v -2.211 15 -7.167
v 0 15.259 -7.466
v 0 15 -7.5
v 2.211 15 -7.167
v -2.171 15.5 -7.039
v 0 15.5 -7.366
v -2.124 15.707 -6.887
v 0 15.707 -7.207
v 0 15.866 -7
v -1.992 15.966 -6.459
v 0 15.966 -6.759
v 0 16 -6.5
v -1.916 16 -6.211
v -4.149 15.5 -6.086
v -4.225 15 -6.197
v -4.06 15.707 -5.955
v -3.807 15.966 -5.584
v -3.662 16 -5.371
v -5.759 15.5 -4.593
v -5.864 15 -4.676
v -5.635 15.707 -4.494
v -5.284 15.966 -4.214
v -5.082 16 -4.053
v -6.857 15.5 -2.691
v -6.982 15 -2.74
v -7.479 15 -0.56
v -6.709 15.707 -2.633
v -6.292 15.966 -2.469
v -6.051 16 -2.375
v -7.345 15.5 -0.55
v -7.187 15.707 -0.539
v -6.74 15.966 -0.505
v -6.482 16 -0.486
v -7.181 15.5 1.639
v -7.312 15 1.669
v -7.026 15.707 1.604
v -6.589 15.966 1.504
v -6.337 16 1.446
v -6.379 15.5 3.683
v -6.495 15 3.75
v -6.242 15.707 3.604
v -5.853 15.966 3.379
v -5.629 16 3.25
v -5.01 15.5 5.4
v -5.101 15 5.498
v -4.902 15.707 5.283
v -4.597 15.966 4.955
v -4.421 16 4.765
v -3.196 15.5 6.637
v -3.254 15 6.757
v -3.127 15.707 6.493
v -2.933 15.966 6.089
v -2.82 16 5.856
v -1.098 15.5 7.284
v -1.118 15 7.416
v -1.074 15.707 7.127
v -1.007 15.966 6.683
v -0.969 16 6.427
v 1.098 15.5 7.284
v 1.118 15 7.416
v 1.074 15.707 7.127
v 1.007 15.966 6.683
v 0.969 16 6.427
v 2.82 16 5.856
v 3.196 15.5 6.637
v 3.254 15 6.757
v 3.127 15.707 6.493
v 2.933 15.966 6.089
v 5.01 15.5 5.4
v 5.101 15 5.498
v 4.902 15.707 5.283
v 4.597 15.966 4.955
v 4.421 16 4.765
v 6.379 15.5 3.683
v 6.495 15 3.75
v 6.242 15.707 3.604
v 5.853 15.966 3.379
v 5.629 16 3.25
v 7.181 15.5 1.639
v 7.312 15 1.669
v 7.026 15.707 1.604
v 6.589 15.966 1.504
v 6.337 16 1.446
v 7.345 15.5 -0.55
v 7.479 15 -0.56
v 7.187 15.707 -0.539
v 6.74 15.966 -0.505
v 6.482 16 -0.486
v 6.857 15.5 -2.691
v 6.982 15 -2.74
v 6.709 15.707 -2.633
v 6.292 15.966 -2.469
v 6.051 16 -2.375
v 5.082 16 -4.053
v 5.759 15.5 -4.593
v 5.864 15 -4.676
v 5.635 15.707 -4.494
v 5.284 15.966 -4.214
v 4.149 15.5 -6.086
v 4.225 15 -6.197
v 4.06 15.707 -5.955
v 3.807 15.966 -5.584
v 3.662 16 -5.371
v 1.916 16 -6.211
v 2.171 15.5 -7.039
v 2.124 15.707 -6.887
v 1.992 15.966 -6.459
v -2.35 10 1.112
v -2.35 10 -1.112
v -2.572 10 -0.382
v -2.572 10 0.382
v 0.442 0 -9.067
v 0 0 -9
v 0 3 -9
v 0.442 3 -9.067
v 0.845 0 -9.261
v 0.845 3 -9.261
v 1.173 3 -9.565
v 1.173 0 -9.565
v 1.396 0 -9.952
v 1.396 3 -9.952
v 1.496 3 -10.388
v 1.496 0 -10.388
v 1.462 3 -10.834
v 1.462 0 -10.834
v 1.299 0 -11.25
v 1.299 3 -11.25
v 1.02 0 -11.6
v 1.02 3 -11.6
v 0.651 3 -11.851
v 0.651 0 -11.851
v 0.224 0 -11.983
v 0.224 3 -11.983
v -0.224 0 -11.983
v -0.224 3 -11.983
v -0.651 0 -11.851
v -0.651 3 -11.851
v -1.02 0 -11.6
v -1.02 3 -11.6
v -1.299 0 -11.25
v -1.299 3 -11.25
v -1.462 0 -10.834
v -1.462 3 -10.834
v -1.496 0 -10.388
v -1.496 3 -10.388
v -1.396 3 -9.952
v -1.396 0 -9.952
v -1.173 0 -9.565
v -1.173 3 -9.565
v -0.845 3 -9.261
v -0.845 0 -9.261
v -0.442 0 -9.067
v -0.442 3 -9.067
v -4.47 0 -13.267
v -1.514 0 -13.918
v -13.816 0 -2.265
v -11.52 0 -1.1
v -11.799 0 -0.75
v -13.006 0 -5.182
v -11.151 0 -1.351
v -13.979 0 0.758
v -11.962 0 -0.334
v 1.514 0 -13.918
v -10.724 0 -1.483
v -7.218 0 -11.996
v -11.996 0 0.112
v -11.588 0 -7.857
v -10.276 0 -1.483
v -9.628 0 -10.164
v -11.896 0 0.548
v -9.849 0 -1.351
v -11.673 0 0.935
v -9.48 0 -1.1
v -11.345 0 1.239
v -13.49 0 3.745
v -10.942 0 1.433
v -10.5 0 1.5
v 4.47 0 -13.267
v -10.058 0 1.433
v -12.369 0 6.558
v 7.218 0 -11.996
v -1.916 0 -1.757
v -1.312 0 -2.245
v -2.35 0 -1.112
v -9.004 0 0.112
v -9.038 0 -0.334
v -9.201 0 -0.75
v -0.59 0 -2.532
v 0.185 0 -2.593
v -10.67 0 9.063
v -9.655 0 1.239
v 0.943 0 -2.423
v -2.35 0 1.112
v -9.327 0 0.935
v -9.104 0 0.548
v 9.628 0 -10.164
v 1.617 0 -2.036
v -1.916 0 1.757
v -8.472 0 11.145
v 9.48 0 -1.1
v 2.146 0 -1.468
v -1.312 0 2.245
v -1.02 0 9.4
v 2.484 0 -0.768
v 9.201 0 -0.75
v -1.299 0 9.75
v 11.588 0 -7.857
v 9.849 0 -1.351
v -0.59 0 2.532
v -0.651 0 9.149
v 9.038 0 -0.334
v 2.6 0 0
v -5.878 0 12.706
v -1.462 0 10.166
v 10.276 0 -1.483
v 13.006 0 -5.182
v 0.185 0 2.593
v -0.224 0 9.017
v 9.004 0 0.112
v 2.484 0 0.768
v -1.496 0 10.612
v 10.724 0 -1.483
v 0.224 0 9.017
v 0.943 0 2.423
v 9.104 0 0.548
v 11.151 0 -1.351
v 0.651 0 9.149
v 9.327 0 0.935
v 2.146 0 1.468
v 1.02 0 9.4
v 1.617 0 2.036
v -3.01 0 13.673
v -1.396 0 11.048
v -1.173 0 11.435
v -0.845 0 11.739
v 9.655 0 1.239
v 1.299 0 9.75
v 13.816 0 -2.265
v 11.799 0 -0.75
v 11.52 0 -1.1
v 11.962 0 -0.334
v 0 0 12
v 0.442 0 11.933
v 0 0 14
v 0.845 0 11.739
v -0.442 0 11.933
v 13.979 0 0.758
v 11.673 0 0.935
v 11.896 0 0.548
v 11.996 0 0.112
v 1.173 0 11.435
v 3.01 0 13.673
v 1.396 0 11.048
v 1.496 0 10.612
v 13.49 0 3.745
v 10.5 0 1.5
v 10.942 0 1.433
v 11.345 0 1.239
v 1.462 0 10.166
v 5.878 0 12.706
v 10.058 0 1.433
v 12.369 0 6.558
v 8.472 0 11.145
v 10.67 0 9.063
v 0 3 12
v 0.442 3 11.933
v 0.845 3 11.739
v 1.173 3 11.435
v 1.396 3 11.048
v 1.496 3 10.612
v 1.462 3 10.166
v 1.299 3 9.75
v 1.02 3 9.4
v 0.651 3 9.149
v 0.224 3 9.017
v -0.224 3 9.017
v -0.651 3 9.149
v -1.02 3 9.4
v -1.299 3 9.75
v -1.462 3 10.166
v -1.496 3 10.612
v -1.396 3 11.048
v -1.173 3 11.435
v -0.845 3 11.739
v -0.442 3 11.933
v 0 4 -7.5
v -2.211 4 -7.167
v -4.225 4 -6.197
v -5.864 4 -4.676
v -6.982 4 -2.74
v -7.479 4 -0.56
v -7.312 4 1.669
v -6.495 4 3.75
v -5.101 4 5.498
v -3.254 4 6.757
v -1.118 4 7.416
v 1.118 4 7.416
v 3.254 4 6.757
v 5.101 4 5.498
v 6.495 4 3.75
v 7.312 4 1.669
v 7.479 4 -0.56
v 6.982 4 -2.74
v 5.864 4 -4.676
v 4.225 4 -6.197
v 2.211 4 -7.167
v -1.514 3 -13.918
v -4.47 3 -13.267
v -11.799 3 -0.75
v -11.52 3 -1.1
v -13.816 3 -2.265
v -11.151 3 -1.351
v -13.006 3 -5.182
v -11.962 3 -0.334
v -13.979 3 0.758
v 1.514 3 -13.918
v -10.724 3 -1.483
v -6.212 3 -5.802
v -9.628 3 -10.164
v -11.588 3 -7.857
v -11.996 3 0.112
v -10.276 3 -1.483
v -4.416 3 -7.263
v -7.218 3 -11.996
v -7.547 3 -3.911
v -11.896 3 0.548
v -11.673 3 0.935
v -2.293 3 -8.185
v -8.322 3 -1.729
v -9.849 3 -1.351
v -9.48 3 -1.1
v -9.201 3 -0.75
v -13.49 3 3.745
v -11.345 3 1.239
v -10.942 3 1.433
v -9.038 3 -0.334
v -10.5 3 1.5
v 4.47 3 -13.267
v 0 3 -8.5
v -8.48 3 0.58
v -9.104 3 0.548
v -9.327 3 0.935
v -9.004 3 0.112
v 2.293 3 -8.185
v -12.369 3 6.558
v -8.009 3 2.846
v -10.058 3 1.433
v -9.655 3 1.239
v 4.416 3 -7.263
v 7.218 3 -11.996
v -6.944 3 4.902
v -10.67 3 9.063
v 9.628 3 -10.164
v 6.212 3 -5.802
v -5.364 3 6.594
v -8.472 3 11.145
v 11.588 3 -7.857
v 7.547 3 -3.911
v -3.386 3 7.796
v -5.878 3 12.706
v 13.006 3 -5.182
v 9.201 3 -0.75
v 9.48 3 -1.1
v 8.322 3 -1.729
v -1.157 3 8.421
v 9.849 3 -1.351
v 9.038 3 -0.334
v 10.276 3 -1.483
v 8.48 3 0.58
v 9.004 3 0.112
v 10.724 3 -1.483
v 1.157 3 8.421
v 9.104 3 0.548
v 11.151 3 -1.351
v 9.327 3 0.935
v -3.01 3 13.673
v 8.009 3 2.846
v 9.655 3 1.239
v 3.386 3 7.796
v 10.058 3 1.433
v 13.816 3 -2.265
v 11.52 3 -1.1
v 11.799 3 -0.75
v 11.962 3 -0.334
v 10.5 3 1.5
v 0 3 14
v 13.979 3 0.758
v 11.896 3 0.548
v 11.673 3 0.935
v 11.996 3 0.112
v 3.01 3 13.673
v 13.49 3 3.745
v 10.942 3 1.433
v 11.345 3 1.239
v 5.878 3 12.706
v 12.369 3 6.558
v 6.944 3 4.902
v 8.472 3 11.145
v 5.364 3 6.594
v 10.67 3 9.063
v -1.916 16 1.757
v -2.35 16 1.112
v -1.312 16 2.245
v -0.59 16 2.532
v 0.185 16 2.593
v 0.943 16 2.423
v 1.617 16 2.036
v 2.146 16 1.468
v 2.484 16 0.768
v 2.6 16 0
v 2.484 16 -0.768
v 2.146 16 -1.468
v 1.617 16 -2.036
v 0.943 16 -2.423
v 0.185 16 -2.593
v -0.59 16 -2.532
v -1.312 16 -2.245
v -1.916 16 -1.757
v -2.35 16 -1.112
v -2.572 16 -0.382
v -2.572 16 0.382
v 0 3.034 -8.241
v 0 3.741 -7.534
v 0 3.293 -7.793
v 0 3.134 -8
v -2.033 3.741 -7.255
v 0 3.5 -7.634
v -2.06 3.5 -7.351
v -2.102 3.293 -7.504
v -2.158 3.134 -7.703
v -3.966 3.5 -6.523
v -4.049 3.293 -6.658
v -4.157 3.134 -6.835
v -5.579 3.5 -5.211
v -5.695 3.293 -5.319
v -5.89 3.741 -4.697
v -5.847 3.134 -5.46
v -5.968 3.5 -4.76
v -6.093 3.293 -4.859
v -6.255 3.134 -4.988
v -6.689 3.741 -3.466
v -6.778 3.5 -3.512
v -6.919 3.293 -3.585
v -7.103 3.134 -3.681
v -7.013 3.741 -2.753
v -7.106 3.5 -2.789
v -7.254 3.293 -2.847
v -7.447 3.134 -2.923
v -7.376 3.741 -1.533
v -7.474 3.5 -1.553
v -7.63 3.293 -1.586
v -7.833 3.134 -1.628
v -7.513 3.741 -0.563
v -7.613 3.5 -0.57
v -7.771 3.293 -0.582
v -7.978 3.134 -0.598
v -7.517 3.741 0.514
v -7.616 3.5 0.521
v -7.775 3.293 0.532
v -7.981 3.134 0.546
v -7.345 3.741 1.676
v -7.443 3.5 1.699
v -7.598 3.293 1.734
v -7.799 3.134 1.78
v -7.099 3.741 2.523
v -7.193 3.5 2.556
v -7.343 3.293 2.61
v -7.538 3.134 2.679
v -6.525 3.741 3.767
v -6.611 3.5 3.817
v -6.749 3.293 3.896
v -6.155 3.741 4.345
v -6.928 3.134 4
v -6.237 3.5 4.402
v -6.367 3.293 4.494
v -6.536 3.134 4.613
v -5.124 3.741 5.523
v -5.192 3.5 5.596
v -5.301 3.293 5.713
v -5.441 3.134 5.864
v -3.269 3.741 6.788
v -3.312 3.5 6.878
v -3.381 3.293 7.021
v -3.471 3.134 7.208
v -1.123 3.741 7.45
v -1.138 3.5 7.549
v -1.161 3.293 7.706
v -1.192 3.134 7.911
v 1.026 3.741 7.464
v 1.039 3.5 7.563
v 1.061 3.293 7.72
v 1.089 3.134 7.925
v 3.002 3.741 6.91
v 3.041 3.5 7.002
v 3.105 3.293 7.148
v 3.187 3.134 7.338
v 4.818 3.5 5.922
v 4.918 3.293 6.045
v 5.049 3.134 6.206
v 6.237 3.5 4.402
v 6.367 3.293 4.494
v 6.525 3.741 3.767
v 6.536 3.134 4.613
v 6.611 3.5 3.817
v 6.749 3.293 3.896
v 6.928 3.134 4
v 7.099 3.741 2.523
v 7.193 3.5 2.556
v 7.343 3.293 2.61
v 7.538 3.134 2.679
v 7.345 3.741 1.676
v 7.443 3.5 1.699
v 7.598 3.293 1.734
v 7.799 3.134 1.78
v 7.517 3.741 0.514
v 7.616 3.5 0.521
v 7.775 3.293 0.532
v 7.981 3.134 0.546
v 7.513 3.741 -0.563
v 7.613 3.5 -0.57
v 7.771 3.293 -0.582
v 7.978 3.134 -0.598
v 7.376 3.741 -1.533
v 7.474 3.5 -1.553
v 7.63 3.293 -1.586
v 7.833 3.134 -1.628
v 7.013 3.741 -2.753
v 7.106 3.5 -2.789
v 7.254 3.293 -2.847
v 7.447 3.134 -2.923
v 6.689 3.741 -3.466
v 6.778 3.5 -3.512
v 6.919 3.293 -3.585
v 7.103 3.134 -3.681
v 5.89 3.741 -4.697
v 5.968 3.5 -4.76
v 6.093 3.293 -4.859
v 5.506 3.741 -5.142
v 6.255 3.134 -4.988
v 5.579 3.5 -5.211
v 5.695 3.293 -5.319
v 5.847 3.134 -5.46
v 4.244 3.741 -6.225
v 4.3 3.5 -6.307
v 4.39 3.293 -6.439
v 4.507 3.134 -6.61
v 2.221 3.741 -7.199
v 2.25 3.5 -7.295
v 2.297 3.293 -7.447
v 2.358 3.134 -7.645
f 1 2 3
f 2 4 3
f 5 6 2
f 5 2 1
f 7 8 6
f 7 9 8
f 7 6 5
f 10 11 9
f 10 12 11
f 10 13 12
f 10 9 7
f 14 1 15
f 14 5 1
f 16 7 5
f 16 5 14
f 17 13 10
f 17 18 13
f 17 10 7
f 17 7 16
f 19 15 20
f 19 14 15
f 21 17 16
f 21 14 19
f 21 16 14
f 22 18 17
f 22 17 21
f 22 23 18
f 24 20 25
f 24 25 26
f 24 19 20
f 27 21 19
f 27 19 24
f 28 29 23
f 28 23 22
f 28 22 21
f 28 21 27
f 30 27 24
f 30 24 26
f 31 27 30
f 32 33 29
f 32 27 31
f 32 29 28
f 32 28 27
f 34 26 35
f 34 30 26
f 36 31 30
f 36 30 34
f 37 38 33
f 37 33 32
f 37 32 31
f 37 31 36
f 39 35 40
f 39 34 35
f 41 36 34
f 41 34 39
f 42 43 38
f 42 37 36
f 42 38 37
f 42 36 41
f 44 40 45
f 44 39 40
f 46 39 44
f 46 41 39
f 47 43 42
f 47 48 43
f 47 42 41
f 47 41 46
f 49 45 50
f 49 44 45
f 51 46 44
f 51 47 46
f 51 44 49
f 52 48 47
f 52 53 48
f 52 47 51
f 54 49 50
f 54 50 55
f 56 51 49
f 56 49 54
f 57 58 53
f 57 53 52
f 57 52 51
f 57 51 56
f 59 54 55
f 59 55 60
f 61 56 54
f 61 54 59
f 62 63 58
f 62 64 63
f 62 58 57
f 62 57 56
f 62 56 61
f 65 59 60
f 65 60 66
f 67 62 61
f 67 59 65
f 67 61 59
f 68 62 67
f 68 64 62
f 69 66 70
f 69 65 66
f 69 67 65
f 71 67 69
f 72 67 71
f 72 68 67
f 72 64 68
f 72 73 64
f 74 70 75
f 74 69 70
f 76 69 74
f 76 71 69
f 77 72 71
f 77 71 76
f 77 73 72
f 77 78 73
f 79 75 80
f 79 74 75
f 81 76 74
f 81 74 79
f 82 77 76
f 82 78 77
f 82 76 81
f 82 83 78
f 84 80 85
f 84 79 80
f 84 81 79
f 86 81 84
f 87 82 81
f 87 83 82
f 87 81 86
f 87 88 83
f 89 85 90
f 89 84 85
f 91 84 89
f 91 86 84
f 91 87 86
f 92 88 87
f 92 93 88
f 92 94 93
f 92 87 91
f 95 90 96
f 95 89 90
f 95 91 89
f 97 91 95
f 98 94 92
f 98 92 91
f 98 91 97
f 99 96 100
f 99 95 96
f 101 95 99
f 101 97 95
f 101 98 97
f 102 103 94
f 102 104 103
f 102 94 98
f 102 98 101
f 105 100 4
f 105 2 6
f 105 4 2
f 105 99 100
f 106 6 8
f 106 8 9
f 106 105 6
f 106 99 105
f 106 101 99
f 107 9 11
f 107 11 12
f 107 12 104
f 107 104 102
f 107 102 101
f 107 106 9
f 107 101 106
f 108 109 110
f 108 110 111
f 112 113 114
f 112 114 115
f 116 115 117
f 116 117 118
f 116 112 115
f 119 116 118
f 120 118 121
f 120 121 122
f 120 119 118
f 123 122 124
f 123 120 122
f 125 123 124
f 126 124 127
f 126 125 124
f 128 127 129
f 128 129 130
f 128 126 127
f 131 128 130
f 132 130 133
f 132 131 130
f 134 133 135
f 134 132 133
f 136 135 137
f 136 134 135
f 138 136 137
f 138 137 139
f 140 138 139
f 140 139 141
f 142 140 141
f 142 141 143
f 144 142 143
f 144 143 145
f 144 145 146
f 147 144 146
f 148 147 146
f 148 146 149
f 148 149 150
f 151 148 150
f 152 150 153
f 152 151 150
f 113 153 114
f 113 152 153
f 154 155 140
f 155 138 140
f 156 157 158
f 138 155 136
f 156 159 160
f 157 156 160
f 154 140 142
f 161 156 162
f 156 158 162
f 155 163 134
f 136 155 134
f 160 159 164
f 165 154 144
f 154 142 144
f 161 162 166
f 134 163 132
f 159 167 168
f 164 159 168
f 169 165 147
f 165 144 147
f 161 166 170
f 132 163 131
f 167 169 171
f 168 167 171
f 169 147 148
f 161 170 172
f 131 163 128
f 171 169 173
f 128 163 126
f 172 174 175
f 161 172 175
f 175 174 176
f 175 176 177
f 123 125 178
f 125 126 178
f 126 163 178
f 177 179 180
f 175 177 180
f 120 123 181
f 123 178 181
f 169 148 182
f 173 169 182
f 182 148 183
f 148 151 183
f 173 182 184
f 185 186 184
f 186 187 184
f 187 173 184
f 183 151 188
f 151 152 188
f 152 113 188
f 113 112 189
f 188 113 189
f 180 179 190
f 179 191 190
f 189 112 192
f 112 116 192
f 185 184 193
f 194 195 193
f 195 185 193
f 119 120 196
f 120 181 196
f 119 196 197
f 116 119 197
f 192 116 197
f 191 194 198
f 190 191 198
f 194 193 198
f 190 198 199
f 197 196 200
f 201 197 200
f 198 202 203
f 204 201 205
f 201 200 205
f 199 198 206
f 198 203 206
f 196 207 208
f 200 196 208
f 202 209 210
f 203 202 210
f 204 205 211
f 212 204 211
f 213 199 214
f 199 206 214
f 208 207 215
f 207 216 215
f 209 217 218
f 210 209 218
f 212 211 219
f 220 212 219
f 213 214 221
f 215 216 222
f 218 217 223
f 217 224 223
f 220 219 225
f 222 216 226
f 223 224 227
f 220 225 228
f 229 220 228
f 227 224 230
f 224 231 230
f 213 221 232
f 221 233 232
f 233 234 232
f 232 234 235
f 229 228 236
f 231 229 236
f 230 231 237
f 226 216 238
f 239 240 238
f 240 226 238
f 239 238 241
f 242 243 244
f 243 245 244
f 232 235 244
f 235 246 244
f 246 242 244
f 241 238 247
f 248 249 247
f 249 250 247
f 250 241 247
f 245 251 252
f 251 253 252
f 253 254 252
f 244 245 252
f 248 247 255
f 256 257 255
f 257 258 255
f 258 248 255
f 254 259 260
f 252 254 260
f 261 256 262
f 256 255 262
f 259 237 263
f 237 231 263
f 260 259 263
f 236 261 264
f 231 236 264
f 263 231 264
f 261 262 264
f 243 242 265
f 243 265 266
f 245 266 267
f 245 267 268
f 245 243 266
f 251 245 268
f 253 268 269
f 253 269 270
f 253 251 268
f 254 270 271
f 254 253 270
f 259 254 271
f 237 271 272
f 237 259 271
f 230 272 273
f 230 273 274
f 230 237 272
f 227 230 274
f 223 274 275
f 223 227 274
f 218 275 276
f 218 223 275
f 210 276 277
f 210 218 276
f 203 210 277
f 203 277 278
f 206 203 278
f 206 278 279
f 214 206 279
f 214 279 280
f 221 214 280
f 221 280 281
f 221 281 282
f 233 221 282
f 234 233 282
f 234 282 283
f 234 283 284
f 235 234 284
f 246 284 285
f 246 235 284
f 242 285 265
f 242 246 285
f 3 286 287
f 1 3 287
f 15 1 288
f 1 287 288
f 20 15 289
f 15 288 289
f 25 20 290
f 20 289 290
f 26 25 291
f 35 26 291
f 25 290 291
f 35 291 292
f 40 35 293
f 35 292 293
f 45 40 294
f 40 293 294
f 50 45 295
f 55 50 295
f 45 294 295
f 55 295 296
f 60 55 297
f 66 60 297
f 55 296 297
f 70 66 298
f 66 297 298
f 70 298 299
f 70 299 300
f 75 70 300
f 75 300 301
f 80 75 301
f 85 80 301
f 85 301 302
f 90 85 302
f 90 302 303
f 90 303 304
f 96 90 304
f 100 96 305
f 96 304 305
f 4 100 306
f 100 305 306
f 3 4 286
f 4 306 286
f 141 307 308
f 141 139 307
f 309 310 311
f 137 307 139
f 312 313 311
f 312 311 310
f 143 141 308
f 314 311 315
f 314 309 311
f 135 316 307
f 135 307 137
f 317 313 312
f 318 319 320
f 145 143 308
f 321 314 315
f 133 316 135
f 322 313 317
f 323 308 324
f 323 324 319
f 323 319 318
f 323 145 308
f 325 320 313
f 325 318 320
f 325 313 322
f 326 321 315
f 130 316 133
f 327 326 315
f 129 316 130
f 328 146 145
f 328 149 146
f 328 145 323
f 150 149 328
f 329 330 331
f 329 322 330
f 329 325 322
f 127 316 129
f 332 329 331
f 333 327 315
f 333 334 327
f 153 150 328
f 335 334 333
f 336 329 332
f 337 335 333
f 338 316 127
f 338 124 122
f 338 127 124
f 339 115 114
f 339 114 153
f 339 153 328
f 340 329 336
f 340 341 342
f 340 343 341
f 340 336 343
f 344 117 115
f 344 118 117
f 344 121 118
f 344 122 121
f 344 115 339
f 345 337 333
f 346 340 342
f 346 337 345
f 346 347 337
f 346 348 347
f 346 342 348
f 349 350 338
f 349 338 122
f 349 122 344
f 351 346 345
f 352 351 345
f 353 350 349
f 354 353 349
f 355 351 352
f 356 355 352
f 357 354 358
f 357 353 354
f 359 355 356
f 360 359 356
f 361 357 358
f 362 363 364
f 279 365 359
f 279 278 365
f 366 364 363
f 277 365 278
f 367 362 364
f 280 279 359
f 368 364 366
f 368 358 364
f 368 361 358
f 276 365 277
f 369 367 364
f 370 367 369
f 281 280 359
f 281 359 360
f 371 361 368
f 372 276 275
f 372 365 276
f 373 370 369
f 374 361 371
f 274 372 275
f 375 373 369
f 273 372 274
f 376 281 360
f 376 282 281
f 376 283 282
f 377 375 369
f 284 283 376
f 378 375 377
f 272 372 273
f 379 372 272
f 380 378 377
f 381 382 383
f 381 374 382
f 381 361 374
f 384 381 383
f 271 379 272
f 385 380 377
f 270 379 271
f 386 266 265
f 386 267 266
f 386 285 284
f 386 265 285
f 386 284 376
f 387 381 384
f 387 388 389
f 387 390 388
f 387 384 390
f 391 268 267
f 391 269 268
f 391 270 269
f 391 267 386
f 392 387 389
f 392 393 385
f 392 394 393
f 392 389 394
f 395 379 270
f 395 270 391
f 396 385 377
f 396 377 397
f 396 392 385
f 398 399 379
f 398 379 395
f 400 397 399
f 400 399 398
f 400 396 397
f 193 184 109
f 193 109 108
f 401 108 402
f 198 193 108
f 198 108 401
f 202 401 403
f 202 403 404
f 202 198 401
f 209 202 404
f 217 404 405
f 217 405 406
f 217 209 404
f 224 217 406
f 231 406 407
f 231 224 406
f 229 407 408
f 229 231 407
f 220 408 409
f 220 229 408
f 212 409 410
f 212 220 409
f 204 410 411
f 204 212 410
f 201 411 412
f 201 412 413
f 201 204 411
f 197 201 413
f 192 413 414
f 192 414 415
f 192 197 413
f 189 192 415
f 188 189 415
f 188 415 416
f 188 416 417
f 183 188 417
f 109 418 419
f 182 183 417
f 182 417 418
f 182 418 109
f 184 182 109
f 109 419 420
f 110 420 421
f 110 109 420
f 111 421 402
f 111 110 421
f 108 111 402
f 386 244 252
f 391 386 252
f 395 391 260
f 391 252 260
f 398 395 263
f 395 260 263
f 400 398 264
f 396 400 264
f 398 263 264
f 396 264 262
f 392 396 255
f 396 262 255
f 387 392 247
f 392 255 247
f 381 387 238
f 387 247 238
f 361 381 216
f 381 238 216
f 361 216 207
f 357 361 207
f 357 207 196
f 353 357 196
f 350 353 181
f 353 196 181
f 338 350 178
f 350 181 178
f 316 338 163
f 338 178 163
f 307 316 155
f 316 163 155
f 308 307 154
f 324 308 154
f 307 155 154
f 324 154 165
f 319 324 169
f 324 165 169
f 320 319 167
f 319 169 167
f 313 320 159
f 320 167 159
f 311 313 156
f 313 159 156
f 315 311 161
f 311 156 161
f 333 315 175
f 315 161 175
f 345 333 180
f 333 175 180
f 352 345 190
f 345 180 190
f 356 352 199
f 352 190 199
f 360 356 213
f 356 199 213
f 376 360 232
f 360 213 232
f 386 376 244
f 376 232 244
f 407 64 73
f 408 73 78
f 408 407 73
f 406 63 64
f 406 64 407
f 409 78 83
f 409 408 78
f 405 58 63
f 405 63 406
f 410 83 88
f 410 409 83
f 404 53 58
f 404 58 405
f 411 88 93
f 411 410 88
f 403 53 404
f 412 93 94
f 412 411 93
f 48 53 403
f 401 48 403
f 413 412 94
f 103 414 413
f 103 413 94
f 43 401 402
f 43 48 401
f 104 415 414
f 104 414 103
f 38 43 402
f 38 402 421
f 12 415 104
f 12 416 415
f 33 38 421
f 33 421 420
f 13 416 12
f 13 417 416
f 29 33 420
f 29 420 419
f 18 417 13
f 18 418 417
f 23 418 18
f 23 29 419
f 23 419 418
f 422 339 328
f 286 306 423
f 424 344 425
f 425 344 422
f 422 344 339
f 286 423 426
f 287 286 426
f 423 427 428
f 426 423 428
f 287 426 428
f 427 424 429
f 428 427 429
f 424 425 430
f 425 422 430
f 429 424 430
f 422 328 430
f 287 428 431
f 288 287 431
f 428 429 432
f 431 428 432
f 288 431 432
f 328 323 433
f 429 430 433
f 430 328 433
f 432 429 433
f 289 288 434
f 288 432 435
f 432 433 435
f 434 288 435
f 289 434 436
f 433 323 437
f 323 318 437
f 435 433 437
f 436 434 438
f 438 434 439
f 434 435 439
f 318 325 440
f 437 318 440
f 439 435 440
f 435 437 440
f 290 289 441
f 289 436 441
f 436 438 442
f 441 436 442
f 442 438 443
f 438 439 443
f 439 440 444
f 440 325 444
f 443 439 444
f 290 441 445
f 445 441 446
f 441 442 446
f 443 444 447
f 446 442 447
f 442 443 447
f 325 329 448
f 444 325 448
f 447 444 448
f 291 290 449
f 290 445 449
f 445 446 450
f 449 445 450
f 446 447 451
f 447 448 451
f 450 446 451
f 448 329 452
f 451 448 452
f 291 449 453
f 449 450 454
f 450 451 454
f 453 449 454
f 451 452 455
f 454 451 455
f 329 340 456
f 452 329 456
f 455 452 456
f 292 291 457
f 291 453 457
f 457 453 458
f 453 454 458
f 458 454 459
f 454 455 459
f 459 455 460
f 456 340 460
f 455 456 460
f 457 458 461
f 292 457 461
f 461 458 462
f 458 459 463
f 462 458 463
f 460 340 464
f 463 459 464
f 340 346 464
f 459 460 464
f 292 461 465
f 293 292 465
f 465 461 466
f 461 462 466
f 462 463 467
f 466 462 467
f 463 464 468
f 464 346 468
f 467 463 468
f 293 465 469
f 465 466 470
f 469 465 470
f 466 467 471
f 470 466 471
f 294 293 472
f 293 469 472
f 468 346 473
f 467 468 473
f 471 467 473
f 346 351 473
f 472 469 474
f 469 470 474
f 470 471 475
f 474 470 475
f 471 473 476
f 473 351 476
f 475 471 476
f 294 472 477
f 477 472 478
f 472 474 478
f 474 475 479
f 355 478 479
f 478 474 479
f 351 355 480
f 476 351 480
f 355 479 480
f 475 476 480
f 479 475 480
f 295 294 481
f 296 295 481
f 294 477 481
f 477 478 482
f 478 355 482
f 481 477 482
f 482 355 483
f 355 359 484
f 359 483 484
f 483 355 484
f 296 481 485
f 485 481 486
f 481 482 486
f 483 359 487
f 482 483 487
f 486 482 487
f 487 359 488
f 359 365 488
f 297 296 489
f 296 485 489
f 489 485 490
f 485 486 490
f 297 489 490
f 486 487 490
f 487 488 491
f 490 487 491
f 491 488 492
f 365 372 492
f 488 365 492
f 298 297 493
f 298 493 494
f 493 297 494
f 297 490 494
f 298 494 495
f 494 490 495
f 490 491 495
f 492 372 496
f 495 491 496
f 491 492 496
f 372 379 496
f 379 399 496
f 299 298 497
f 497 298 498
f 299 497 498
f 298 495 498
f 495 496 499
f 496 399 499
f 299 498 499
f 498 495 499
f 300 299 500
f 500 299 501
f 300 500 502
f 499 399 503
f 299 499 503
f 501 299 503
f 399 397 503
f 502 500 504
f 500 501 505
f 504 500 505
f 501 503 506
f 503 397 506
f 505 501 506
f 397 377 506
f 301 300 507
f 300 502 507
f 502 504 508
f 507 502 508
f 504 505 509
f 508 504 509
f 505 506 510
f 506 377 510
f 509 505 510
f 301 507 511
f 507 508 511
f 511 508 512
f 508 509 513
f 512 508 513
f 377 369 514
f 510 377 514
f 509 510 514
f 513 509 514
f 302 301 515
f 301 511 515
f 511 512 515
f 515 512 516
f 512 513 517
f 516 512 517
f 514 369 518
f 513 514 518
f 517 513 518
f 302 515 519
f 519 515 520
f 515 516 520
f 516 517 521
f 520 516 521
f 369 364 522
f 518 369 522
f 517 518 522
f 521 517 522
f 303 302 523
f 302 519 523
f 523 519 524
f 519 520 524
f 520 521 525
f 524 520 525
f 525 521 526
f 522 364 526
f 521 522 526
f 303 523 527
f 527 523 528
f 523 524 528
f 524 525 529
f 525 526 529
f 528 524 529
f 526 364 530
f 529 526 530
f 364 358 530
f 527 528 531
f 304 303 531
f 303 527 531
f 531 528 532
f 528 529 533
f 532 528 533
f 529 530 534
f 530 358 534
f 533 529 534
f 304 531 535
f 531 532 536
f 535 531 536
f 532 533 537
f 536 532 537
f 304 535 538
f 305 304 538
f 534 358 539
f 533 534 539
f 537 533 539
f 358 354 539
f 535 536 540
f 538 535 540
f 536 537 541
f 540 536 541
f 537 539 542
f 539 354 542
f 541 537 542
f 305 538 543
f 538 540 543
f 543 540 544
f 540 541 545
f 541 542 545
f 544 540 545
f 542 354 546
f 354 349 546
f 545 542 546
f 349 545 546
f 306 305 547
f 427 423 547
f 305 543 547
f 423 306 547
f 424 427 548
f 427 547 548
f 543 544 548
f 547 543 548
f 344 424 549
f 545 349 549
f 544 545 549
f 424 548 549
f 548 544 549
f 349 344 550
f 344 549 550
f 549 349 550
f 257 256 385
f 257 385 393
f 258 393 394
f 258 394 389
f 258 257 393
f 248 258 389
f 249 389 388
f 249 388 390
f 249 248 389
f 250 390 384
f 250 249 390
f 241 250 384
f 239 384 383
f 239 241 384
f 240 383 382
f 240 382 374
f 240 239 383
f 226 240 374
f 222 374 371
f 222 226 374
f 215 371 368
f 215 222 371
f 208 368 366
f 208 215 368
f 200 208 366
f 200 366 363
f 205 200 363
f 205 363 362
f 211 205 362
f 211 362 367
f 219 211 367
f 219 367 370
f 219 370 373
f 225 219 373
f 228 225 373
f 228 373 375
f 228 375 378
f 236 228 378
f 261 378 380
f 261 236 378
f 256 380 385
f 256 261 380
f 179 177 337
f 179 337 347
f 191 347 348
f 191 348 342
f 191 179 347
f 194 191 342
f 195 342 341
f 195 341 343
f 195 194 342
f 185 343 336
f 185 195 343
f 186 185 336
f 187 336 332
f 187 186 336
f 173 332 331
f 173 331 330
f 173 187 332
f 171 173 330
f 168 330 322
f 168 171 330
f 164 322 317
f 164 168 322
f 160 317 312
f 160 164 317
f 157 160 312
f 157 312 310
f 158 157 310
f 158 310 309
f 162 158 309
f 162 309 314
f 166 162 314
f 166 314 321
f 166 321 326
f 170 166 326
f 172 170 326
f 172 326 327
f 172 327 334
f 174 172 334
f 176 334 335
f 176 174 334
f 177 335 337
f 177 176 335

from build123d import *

# Parameters (mm, degrees)
SKETCH1_R           = 14
SKETCH1_R_2         = 1.5
BOSS_EXTRUDE1_DEPTH = 3
SKETCH2_R           = 7.5
BOSS_EXTRUDE2_DEPTH = 13
FILLET1_R           = 1
CUT_EXTRUDE2_START  = -6
SKETCH4_R           = 2.6
CUT_EXTRUDE2_DEPTH  = 6


with BuildPart() as part:
    # Sketch1 → Boss-Extrude1 (new body)
    with BuildSketch(Plane(origin=(0, 0, 0), x_dir=(1, 0, 0), z_dir=(0, 1, 0))):
        with Locations(Location((0, 0, 0), (0, 0, 270))):
            Circle(SKETCH1_R)
        with Locations(Location((0, 10.5, 0), (0, 0, 270))):
            Circle(SKETCH1_R_2, mode=Mode.SUBTRACT)
        with Locations(Location((10.5, 0, 0), (0, 0, 270))):
            Circle(SKETCH1_R_2, mode=Mode.SUBTRACT)
        with Locations(Location((0, -10.5, 0), (0, 0, 270))):
            Circle(SKETCH1_R_2, mode=Mode.SUBTRACT)
        with Locations(Location((-10.5, 0, 0), (0, 0, 270))):
            Circle(SKETCH1_R_2, mode=Mode.SUBTRACT)
        with BuildLine():
            Line((-2.35, 1.112429773), (-2.35, -1.112429773))
            ThreePointArc((-2.35, -1.112429773), (2.6, 0), (-2.35, 1.112429773))
        make_face(mode=Mode.SUBTRACT)
    extrude(amount=BOSS_EXTRUDE1_DEPTH)

    # Sketch2 → Boss-Extrude2 (add)
    with BuildSketch(Plane(origin=(0, 3, 0), x_dir=(1, 0, 0), z_dir=(0, 1, 0))):
        with Locations(Location((0, 0, 0), (0, 0, 90))):
            Circle(SKETCH2_R)
        with BuildLine():
            Line((-2.35, 1.112429773), (-2.35, -1.112429773))
            ThreePointArc((-2.35, -1.112429773), (2.6, 0), (-2.35, 1.112429773))
        make_face(mode=Mode.SUBTRACT)
    extrude(amount=BOSS_EXTRUDE2_DEPTH)

    # Fillet1
    fillet1_edges = [part.edges().sort_by_distance(p)[0] for p in [
        (0, 3, 7.5),
        (0, 16, 7.5),
    ]]
    fillet(fillet1_edges, radius=FILLET1_R)

    # Sketch4 → Cut-Extrude2 (cut)
    with BuildSketch(Plane(origin=(0, 16, 0), x_dir=(1, 0, 0), z_dir=(0, 1, 0)).offset(CUT_EXTRUDE2_START)):
        with Locations(Location((0, 0, 0), (0, 0, 154.668324983))):
            Circle(SKETCH4_R)
    extrude(amount=CUT_EXTRUDE2_DEPTH, mode=Mode.SUBTRACT)


solid = part.part
